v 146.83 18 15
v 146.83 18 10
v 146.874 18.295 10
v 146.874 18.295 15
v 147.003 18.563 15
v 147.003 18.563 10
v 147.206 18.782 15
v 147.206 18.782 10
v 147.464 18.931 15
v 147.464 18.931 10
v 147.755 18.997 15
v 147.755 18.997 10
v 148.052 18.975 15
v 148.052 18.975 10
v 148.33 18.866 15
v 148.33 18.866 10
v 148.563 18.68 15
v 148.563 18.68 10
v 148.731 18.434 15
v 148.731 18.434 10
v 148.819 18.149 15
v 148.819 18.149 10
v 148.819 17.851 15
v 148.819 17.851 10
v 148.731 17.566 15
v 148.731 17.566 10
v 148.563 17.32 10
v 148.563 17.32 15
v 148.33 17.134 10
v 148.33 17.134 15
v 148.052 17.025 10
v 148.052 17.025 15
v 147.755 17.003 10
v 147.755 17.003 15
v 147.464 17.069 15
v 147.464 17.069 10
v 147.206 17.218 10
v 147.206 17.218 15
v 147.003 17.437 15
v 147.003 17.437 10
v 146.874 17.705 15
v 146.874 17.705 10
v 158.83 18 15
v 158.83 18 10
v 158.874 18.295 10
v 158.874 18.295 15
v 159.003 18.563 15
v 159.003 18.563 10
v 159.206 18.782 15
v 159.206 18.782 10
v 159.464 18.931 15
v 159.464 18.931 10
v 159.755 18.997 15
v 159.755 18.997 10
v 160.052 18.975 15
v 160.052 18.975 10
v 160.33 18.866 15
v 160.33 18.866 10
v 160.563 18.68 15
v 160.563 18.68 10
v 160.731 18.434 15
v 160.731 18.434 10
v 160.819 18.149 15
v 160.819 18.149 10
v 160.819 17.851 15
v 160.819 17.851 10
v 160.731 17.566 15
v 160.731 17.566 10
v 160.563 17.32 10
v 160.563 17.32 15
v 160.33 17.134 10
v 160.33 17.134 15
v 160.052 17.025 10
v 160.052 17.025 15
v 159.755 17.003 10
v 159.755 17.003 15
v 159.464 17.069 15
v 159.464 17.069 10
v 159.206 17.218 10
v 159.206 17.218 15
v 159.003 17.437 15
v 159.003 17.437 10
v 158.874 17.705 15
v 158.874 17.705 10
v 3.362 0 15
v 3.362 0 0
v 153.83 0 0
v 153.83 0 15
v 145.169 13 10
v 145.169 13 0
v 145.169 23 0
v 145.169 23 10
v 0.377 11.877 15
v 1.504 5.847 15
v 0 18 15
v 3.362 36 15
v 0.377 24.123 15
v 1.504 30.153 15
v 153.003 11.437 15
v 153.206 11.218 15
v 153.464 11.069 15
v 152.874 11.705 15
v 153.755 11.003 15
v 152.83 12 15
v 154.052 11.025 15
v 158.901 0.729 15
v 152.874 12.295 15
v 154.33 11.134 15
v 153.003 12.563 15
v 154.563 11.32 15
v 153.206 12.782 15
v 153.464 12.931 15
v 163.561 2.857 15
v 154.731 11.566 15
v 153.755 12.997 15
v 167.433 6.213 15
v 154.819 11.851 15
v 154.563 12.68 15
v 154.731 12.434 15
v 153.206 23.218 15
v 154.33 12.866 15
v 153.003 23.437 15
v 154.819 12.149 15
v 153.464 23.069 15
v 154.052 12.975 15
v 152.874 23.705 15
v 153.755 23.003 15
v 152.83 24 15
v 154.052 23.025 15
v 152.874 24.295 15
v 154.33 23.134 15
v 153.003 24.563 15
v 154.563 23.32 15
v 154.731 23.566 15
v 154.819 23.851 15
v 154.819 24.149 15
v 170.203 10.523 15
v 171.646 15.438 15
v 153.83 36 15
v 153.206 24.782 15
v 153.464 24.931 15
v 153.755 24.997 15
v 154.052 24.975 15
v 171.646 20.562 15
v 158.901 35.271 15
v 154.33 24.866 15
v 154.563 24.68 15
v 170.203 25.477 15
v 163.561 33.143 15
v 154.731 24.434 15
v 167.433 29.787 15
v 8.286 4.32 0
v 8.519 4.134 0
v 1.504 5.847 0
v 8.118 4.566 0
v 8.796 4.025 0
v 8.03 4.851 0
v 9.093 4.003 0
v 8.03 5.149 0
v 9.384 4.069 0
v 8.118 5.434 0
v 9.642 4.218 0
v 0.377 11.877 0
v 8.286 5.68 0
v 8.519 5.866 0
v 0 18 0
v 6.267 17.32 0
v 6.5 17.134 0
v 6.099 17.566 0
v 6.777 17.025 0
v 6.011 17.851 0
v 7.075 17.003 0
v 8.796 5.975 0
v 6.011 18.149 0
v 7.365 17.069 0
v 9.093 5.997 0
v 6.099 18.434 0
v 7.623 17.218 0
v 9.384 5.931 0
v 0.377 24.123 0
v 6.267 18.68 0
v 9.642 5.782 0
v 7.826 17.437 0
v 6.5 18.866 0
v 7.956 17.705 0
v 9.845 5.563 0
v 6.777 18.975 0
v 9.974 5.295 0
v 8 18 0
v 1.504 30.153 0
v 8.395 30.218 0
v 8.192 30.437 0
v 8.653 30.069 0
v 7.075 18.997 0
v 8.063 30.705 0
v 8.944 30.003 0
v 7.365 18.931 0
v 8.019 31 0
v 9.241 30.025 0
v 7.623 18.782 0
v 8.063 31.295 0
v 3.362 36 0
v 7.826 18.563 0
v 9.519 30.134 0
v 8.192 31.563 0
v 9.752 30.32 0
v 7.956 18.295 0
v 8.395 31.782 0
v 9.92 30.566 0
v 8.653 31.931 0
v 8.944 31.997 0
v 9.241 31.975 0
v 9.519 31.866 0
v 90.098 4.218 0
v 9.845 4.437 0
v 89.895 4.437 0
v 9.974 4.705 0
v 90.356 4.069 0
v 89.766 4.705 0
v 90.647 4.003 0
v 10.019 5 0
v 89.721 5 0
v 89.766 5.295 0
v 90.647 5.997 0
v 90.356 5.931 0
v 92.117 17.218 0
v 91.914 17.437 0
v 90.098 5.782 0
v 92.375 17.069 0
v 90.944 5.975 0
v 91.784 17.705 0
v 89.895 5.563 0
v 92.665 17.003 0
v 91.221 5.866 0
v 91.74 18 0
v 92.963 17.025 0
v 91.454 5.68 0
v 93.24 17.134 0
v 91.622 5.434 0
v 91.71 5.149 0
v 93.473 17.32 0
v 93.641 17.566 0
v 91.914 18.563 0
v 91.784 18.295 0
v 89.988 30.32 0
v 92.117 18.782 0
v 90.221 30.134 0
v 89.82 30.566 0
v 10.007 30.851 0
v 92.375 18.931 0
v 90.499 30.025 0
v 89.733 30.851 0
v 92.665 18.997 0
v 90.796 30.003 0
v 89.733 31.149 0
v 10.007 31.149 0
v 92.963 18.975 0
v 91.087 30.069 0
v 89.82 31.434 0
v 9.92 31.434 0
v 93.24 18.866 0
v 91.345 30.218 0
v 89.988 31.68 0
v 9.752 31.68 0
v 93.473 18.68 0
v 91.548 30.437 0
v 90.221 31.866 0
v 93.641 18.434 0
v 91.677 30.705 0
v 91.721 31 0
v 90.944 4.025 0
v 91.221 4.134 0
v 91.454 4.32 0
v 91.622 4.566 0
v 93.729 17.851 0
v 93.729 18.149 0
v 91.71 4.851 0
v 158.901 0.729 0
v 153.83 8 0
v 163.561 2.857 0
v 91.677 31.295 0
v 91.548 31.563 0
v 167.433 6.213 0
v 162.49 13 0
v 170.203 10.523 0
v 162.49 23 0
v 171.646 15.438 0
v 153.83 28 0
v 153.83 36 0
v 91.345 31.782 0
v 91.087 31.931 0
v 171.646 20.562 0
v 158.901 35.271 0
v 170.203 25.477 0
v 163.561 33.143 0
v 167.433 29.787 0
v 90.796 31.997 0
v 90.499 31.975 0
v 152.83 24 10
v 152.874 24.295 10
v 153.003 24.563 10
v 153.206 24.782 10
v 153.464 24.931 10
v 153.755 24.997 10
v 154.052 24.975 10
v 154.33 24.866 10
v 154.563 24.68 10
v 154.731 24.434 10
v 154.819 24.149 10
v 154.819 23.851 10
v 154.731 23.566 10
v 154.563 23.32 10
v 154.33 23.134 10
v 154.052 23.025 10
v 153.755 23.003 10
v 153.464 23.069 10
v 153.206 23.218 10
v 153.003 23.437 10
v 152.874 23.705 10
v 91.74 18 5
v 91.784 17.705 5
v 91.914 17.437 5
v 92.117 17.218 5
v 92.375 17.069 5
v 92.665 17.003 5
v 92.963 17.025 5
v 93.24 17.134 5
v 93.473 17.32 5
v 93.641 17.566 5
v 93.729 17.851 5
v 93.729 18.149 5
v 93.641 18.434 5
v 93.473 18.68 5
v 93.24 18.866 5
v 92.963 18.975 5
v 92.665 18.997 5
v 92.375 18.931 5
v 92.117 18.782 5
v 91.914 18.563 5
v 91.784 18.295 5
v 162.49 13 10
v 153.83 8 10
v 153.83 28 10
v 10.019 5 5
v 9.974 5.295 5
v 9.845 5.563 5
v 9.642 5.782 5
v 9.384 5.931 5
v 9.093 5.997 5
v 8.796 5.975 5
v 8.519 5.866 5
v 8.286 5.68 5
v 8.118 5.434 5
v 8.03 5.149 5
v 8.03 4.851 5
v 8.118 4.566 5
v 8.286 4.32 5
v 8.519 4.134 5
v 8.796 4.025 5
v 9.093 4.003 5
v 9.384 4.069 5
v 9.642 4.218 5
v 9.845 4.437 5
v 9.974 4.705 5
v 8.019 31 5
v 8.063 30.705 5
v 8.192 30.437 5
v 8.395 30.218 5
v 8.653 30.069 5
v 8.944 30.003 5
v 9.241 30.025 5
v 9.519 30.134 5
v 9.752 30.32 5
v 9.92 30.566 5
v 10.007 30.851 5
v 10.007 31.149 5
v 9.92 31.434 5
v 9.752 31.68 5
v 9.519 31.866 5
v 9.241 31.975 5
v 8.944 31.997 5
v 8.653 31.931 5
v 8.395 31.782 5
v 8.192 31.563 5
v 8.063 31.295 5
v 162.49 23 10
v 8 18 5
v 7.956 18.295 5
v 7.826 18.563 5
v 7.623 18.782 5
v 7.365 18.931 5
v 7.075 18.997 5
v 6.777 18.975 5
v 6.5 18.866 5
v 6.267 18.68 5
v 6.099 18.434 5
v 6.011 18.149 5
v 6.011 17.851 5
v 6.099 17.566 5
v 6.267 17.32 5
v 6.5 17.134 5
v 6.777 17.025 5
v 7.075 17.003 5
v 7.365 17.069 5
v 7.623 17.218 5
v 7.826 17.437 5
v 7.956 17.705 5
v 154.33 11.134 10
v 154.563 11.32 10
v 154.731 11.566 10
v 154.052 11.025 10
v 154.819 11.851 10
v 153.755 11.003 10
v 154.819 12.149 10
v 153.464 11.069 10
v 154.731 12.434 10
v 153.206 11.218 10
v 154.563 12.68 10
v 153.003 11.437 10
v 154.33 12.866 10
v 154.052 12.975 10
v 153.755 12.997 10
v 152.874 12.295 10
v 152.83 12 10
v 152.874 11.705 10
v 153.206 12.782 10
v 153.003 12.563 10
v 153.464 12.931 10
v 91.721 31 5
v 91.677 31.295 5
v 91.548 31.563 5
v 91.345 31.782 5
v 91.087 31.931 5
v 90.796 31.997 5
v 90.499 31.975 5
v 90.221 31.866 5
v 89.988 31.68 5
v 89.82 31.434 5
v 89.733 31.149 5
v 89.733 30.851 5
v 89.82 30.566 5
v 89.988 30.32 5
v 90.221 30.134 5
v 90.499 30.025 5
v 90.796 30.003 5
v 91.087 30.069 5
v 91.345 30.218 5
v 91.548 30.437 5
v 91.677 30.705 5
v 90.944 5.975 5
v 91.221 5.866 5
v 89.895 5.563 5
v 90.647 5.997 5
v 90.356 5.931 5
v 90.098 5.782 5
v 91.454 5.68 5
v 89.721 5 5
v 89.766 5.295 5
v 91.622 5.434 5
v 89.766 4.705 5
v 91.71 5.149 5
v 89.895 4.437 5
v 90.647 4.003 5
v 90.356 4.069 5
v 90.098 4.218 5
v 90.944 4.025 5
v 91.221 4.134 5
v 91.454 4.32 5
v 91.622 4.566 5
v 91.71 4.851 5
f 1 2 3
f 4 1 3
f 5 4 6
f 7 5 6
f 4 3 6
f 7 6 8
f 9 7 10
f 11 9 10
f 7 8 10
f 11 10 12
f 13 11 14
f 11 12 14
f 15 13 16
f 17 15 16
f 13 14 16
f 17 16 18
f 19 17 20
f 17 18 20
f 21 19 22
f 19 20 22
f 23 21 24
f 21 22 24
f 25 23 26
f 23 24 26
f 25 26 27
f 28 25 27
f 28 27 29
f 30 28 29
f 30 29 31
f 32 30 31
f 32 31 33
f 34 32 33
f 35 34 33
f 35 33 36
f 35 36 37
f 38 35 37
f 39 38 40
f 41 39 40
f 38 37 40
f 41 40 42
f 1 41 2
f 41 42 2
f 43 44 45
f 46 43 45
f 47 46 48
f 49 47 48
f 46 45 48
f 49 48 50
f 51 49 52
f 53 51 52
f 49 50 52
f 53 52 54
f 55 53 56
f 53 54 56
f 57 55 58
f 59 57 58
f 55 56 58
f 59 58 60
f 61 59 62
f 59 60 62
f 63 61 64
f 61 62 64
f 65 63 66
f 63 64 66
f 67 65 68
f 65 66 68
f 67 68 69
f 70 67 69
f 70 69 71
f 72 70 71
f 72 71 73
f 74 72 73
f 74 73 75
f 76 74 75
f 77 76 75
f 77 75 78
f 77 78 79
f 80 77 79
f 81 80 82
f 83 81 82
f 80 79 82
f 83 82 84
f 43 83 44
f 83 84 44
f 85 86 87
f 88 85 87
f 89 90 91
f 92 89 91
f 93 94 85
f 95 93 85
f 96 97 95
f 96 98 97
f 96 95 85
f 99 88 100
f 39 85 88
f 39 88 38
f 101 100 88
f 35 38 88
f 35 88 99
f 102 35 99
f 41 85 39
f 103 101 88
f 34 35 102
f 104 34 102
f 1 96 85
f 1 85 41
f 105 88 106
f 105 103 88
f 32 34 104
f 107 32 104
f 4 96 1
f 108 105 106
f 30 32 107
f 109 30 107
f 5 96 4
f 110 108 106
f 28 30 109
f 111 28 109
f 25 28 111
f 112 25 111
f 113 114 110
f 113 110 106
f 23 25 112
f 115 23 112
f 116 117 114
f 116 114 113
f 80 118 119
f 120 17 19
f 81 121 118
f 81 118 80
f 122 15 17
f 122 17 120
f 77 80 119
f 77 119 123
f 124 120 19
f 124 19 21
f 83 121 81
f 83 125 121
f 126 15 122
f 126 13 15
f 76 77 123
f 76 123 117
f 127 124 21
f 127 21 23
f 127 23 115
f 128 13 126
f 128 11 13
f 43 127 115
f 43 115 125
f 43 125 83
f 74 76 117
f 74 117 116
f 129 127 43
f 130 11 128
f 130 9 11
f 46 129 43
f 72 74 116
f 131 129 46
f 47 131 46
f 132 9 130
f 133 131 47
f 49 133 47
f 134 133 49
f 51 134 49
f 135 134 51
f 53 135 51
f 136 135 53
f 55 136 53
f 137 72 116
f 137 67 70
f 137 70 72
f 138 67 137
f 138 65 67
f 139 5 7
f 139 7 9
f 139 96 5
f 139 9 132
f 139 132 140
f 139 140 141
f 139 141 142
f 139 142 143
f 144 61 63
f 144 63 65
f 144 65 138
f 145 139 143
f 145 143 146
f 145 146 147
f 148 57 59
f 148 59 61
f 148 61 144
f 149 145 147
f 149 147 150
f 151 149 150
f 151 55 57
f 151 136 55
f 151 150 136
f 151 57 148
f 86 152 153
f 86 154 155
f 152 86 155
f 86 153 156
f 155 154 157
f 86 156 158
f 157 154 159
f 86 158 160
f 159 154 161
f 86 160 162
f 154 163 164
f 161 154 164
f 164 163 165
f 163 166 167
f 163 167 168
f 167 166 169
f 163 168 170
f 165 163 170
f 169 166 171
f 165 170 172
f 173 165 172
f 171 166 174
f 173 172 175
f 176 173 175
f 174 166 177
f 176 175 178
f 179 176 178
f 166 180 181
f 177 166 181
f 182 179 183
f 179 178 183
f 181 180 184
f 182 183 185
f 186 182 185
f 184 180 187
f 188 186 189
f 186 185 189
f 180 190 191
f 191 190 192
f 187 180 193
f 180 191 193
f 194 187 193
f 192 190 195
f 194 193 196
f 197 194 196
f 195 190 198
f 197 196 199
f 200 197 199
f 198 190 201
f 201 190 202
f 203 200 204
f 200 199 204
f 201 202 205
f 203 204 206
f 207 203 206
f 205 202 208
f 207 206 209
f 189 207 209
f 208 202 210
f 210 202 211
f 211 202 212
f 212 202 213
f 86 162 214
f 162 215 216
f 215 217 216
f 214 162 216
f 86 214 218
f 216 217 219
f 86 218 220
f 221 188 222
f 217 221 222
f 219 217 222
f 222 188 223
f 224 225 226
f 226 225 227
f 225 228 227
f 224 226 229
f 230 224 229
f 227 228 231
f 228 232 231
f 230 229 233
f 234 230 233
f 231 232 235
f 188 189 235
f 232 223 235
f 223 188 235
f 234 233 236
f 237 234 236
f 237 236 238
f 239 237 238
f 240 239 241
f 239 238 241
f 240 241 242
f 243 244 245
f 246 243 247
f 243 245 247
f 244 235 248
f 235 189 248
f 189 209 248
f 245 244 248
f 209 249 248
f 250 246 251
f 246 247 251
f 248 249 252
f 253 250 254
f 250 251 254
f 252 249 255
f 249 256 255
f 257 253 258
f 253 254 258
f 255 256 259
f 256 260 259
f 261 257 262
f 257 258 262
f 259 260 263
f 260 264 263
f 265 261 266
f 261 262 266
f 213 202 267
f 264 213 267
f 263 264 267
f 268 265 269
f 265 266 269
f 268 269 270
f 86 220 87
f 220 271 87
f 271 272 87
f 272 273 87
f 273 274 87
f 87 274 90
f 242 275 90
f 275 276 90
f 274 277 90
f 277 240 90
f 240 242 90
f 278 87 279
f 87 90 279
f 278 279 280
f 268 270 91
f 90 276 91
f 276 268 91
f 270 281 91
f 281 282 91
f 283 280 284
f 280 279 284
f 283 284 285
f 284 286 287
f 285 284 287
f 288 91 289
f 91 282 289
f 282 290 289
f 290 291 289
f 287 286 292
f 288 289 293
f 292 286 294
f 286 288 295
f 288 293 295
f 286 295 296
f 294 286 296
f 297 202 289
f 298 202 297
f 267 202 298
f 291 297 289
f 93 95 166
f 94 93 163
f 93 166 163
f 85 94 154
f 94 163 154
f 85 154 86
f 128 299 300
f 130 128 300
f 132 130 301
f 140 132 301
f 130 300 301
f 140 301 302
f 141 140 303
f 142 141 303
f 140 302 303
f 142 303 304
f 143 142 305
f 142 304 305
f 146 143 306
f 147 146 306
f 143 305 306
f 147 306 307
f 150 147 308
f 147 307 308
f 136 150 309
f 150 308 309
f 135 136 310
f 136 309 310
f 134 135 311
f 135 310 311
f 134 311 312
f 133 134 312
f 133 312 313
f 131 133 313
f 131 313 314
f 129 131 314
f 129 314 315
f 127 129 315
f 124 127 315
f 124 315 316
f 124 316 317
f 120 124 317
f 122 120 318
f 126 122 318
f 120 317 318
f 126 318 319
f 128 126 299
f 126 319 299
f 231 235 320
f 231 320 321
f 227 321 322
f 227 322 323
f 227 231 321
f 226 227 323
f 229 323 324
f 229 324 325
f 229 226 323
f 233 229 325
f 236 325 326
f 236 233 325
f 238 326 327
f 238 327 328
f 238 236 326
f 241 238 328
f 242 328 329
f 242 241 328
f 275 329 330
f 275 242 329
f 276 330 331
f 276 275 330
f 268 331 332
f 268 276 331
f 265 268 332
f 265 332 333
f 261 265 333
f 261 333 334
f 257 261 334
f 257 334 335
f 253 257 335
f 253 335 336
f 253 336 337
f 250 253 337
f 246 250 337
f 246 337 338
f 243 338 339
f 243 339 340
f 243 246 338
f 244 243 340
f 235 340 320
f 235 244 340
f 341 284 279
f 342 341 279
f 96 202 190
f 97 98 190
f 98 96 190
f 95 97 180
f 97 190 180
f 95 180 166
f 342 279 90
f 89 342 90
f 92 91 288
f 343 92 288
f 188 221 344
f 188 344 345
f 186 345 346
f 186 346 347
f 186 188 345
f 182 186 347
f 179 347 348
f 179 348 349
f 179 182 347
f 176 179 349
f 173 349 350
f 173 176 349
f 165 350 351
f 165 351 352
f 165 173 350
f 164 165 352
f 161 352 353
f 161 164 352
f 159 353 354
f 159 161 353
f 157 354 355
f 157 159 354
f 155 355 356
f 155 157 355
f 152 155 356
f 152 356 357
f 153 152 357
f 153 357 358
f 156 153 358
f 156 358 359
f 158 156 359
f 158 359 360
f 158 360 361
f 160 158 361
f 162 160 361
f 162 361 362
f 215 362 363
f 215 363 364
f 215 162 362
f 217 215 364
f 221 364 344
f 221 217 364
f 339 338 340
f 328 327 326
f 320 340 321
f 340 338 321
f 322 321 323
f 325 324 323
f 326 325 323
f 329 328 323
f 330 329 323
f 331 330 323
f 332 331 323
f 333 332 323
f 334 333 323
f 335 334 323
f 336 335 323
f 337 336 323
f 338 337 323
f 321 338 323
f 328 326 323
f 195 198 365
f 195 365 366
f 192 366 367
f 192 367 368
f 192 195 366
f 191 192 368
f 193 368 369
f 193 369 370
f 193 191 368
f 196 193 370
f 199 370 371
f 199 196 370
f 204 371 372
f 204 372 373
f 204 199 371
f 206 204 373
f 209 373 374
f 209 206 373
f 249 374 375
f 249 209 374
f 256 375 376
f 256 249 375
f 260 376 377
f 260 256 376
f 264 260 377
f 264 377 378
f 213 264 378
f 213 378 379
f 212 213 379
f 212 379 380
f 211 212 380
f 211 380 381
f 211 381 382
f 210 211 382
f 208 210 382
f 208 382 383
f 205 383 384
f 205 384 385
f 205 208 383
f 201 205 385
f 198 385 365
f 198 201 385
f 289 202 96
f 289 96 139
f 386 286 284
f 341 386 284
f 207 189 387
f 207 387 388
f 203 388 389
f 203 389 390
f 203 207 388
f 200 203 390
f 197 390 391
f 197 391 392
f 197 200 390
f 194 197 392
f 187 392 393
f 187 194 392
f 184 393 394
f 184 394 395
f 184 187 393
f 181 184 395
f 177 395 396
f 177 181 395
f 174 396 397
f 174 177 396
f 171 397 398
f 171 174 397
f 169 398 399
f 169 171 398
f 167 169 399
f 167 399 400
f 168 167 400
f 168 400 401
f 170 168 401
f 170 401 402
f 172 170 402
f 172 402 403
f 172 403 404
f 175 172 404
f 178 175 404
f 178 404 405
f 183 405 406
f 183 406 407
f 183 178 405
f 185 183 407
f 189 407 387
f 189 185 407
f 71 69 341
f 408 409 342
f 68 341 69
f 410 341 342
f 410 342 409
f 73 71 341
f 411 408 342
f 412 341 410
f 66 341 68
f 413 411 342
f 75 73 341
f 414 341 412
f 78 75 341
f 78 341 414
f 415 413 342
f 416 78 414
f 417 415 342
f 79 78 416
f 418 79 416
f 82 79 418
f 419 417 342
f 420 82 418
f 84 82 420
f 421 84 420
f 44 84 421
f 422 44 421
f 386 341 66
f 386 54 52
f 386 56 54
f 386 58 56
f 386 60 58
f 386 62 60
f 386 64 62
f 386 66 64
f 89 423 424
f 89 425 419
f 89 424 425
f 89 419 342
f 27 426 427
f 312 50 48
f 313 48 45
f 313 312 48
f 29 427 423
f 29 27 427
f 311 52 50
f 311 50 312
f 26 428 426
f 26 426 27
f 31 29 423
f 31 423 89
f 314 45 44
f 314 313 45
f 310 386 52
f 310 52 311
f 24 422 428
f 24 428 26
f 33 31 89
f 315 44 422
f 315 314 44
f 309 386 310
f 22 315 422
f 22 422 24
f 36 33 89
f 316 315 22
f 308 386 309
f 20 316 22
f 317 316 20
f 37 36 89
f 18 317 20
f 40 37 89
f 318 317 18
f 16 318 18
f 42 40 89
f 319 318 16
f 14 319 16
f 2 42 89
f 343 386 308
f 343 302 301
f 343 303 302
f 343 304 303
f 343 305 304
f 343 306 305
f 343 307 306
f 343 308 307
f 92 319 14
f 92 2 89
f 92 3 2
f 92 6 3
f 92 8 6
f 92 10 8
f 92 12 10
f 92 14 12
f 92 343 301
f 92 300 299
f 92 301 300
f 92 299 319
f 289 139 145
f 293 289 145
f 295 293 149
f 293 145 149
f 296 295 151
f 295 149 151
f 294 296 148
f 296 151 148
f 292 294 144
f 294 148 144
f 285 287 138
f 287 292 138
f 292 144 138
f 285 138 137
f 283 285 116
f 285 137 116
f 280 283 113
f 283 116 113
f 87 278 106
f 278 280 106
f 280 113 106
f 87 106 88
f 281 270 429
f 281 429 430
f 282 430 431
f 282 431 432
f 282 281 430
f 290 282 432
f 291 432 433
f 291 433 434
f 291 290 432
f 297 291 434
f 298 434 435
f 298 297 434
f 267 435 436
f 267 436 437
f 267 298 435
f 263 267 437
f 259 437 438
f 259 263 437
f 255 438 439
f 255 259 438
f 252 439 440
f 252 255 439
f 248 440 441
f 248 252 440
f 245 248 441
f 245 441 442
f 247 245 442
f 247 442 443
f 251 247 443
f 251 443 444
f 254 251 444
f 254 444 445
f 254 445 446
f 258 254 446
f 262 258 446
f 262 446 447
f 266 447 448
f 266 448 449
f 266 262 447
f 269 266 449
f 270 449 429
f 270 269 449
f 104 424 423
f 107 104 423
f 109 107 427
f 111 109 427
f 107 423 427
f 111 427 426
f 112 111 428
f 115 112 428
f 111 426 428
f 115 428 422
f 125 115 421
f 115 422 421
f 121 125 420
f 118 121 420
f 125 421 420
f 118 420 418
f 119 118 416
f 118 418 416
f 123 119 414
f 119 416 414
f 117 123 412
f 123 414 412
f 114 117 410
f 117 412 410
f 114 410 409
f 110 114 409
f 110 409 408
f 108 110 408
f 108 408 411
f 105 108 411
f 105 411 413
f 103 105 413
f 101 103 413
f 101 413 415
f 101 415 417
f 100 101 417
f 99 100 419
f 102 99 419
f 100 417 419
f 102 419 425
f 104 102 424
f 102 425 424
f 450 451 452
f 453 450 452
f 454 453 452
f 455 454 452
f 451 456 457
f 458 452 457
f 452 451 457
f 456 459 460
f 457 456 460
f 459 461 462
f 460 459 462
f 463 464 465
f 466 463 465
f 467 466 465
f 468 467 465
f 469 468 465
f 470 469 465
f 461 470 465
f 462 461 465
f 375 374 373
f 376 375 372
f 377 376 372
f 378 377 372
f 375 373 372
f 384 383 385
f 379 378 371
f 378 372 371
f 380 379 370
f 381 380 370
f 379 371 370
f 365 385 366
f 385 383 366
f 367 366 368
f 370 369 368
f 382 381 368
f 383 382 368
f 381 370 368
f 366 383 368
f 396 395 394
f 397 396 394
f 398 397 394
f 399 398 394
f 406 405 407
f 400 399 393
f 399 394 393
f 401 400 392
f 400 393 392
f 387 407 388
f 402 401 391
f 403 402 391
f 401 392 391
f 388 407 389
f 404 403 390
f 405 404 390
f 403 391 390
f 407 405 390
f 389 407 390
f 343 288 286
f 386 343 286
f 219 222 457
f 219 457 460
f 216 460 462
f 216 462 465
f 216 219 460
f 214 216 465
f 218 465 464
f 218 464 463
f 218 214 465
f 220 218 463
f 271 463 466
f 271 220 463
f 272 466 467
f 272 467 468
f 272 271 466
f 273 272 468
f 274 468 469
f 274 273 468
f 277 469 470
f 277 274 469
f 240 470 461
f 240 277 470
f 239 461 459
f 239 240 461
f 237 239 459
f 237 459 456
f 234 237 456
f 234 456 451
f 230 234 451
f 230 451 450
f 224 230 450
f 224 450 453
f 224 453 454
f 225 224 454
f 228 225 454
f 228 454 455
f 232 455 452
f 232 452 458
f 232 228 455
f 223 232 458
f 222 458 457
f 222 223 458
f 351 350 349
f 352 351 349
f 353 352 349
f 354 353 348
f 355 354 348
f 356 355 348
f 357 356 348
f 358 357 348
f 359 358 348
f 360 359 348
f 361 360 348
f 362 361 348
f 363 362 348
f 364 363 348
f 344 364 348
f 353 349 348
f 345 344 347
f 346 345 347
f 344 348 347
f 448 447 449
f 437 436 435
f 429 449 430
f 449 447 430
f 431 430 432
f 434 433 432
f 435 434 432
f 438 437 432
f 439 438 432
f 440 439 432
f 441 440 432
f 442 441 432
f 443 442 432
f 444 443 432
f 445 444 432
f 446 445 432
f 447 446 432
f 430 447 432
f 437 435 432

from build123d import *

# Parameters (mm, degrees)
SKETCH_1_W          = 300
SKETCH_1_H          = 36
EXTRUDE_1_DEPTH     = 15
SKETCH_2_R          = 1
CUT_EXTRUDE_2_DEPTH = 5
CUT_EXTRUDE_3_DEPTH = 10
CUT_EXTRUDE_4_REACH = 304.524
SKETCH_5_R          = 1
CUT_EXTRUDE_5_DEPTH = 5
CUT_EXTRUDE_6_REACH = 178.2


with BuildPart() as part:
    # 草图1 → 凸台-拉伸1 (new body)
    with BuildSketch(Plane.XY):
        with Locations((150, 18)):
            Rectangle(SKETCH_1_W, SKETCH_1_H)
    extrude(amount=EXTRUDE_1_DEPTH)

    # 草图2 → 切除-拉伸2 (cut)
    with BuildSketch(Plane.XY):
        with Locations((9.018599779, 31)):
            Circle(SKETCH_2_R)
        with Locations((9.018599779, 5)):
            Circle(SKETCH_2_R)
        with Locations((7, 18)):
            Circle(SKETCH_2_R)
        with Locations((90.721400221, 5)):
            Circle(SKETCH_2_R)
        with Locations((90.721400221, 31)):
            Circle(SKETCH_2_R)
        with Locations((92.74, 18)):
            Circle(SKETCH_2_R)
    extrude(amount=CUT_EXTRUDE_2_DEPTH, mode=Mode.SUBTRACT)

    # 草图3 → 切除-拉伸3 (cut)
    with BuildSketch(Plane(origin=(0, 0, 0), x_dir=(-1, 0, 0), z_dir=(0, 0, -1))):
        Polygon((-145.169424203, 23), (-153.829678241, 28), (-162.489932279, 23), (-162.489932279, 13), (-153.829678241, 8), (-145.169424203, 13), align=None)
    extrude(amount=-CUT_EXTRUDE_3_DEPTH, mode=Mode.SUBTRACT)

    # 草图4 → 切除-拉伸4 (cut, up to next)
    with BuildSketch(Plane.XY.offset(15), mode=Mode.PRIVATE) as cut_extrude_4_sk1:
        with BuildLine():
            Line((300, 36), (153.829678241, 36))
            ThreePointArc((153.829678241, 36), (171.829678241, 18), (153.829678241, 0))
            Line((153.829678241, 0), (300, 0))
            Line((300, 0), (300, 36))
        make_face()
    cut_extrude_4_tool1 = extrude(cut_extrude_4_sk1.sketch, amount=-CUT_EXTRUDE_4_REACH, mode=Mode.PRIVATE) & part.part
    add(cut_extrude_4_tool1.solids().sort_by_distance((233.9223, 18, 15))[0], mode=Mode.SUBTRACT)

    # 草图5 → 切除-拉伸5 (cut)
    with BuildSketch(Plane(origin=(0, 0, 10), x_dir=(-1, 0, 0), z_dir=(0, 0, -1))):
        with Locations((-153.829678241, 24)):
            Circle(SKETCH_5_R)
        with Locations((-147.829678241, 18)):
            Circle(SKETCH_5_R)
        with Locations((-159.829678241, 18)):
            Circle(SKETCH_5_R)
        with Locations((-153.829678241, 12)):
            Circle(SKETCH_5_R)
    extrude(amount=-CUT_EXTRUDE_5_DEPTH, mode=Mode.SUBTRACT)

    # 草图6 → 切除-拉伸6 (cut, up to next)
    with BuildSketch(Plane(origin=(0, 0, 0), x_dir=(-1, 0, 0), z_dir=(0, 0, -1)), mode=Mode.PRIVATE) as cut_extrude_6_sk1:
        with BuildLine():
            ThreePointArc((0, 18), (-0.847642328, 8.844381598), (-3.361754494, 0))
            Line((-3.361754494, 0), (0, 0))
            Line((0, 0), (0, 18))
        make_face()
    cut_extrude_6_tool1 = extrude(cut_extrude_6_sk1.sketch, amount=-CUT_EXTRUDE_6_REACH, mode=Mode.PRIVATE) & part.part
    # 草图6 → 切除-拉伸6 (cut, up to next)
    with BuildSketch(Plane(origin=(0, 0, 0), x_dir=(-1, 0, 0), z_dir=(0, 0, -1)), mode=Mode.PRIVATE) as cut_extrude_6_sk2:
        with BuildLine():
            ThreePointArc((-3.361754494, 36), (-0.847642328, 27.155618402), (0, 18))
            Line((0, 18), (0, 36))
            Line((0, 36), (-3.361754494, 36))
        make_face()
    cut_extrude_6_tool2 = extrude(cut_extrude_6_sk2.sketch, amount=-CUT_EXTRUDE_6_REACH, mode=Mode.PRIVATE) & part.part
    add(cut_extrude_6_tool1.solids().sort_by_distance((1.002419, 4.469106, 0))[0], mode=Mode.SUBTRACT)
    add(cut_extrude_6_tool2.solids().sort_by_distance((1.002419, 31.530894, 0))[0], mode=Mode.SUBTRACT)


solid = part.part
